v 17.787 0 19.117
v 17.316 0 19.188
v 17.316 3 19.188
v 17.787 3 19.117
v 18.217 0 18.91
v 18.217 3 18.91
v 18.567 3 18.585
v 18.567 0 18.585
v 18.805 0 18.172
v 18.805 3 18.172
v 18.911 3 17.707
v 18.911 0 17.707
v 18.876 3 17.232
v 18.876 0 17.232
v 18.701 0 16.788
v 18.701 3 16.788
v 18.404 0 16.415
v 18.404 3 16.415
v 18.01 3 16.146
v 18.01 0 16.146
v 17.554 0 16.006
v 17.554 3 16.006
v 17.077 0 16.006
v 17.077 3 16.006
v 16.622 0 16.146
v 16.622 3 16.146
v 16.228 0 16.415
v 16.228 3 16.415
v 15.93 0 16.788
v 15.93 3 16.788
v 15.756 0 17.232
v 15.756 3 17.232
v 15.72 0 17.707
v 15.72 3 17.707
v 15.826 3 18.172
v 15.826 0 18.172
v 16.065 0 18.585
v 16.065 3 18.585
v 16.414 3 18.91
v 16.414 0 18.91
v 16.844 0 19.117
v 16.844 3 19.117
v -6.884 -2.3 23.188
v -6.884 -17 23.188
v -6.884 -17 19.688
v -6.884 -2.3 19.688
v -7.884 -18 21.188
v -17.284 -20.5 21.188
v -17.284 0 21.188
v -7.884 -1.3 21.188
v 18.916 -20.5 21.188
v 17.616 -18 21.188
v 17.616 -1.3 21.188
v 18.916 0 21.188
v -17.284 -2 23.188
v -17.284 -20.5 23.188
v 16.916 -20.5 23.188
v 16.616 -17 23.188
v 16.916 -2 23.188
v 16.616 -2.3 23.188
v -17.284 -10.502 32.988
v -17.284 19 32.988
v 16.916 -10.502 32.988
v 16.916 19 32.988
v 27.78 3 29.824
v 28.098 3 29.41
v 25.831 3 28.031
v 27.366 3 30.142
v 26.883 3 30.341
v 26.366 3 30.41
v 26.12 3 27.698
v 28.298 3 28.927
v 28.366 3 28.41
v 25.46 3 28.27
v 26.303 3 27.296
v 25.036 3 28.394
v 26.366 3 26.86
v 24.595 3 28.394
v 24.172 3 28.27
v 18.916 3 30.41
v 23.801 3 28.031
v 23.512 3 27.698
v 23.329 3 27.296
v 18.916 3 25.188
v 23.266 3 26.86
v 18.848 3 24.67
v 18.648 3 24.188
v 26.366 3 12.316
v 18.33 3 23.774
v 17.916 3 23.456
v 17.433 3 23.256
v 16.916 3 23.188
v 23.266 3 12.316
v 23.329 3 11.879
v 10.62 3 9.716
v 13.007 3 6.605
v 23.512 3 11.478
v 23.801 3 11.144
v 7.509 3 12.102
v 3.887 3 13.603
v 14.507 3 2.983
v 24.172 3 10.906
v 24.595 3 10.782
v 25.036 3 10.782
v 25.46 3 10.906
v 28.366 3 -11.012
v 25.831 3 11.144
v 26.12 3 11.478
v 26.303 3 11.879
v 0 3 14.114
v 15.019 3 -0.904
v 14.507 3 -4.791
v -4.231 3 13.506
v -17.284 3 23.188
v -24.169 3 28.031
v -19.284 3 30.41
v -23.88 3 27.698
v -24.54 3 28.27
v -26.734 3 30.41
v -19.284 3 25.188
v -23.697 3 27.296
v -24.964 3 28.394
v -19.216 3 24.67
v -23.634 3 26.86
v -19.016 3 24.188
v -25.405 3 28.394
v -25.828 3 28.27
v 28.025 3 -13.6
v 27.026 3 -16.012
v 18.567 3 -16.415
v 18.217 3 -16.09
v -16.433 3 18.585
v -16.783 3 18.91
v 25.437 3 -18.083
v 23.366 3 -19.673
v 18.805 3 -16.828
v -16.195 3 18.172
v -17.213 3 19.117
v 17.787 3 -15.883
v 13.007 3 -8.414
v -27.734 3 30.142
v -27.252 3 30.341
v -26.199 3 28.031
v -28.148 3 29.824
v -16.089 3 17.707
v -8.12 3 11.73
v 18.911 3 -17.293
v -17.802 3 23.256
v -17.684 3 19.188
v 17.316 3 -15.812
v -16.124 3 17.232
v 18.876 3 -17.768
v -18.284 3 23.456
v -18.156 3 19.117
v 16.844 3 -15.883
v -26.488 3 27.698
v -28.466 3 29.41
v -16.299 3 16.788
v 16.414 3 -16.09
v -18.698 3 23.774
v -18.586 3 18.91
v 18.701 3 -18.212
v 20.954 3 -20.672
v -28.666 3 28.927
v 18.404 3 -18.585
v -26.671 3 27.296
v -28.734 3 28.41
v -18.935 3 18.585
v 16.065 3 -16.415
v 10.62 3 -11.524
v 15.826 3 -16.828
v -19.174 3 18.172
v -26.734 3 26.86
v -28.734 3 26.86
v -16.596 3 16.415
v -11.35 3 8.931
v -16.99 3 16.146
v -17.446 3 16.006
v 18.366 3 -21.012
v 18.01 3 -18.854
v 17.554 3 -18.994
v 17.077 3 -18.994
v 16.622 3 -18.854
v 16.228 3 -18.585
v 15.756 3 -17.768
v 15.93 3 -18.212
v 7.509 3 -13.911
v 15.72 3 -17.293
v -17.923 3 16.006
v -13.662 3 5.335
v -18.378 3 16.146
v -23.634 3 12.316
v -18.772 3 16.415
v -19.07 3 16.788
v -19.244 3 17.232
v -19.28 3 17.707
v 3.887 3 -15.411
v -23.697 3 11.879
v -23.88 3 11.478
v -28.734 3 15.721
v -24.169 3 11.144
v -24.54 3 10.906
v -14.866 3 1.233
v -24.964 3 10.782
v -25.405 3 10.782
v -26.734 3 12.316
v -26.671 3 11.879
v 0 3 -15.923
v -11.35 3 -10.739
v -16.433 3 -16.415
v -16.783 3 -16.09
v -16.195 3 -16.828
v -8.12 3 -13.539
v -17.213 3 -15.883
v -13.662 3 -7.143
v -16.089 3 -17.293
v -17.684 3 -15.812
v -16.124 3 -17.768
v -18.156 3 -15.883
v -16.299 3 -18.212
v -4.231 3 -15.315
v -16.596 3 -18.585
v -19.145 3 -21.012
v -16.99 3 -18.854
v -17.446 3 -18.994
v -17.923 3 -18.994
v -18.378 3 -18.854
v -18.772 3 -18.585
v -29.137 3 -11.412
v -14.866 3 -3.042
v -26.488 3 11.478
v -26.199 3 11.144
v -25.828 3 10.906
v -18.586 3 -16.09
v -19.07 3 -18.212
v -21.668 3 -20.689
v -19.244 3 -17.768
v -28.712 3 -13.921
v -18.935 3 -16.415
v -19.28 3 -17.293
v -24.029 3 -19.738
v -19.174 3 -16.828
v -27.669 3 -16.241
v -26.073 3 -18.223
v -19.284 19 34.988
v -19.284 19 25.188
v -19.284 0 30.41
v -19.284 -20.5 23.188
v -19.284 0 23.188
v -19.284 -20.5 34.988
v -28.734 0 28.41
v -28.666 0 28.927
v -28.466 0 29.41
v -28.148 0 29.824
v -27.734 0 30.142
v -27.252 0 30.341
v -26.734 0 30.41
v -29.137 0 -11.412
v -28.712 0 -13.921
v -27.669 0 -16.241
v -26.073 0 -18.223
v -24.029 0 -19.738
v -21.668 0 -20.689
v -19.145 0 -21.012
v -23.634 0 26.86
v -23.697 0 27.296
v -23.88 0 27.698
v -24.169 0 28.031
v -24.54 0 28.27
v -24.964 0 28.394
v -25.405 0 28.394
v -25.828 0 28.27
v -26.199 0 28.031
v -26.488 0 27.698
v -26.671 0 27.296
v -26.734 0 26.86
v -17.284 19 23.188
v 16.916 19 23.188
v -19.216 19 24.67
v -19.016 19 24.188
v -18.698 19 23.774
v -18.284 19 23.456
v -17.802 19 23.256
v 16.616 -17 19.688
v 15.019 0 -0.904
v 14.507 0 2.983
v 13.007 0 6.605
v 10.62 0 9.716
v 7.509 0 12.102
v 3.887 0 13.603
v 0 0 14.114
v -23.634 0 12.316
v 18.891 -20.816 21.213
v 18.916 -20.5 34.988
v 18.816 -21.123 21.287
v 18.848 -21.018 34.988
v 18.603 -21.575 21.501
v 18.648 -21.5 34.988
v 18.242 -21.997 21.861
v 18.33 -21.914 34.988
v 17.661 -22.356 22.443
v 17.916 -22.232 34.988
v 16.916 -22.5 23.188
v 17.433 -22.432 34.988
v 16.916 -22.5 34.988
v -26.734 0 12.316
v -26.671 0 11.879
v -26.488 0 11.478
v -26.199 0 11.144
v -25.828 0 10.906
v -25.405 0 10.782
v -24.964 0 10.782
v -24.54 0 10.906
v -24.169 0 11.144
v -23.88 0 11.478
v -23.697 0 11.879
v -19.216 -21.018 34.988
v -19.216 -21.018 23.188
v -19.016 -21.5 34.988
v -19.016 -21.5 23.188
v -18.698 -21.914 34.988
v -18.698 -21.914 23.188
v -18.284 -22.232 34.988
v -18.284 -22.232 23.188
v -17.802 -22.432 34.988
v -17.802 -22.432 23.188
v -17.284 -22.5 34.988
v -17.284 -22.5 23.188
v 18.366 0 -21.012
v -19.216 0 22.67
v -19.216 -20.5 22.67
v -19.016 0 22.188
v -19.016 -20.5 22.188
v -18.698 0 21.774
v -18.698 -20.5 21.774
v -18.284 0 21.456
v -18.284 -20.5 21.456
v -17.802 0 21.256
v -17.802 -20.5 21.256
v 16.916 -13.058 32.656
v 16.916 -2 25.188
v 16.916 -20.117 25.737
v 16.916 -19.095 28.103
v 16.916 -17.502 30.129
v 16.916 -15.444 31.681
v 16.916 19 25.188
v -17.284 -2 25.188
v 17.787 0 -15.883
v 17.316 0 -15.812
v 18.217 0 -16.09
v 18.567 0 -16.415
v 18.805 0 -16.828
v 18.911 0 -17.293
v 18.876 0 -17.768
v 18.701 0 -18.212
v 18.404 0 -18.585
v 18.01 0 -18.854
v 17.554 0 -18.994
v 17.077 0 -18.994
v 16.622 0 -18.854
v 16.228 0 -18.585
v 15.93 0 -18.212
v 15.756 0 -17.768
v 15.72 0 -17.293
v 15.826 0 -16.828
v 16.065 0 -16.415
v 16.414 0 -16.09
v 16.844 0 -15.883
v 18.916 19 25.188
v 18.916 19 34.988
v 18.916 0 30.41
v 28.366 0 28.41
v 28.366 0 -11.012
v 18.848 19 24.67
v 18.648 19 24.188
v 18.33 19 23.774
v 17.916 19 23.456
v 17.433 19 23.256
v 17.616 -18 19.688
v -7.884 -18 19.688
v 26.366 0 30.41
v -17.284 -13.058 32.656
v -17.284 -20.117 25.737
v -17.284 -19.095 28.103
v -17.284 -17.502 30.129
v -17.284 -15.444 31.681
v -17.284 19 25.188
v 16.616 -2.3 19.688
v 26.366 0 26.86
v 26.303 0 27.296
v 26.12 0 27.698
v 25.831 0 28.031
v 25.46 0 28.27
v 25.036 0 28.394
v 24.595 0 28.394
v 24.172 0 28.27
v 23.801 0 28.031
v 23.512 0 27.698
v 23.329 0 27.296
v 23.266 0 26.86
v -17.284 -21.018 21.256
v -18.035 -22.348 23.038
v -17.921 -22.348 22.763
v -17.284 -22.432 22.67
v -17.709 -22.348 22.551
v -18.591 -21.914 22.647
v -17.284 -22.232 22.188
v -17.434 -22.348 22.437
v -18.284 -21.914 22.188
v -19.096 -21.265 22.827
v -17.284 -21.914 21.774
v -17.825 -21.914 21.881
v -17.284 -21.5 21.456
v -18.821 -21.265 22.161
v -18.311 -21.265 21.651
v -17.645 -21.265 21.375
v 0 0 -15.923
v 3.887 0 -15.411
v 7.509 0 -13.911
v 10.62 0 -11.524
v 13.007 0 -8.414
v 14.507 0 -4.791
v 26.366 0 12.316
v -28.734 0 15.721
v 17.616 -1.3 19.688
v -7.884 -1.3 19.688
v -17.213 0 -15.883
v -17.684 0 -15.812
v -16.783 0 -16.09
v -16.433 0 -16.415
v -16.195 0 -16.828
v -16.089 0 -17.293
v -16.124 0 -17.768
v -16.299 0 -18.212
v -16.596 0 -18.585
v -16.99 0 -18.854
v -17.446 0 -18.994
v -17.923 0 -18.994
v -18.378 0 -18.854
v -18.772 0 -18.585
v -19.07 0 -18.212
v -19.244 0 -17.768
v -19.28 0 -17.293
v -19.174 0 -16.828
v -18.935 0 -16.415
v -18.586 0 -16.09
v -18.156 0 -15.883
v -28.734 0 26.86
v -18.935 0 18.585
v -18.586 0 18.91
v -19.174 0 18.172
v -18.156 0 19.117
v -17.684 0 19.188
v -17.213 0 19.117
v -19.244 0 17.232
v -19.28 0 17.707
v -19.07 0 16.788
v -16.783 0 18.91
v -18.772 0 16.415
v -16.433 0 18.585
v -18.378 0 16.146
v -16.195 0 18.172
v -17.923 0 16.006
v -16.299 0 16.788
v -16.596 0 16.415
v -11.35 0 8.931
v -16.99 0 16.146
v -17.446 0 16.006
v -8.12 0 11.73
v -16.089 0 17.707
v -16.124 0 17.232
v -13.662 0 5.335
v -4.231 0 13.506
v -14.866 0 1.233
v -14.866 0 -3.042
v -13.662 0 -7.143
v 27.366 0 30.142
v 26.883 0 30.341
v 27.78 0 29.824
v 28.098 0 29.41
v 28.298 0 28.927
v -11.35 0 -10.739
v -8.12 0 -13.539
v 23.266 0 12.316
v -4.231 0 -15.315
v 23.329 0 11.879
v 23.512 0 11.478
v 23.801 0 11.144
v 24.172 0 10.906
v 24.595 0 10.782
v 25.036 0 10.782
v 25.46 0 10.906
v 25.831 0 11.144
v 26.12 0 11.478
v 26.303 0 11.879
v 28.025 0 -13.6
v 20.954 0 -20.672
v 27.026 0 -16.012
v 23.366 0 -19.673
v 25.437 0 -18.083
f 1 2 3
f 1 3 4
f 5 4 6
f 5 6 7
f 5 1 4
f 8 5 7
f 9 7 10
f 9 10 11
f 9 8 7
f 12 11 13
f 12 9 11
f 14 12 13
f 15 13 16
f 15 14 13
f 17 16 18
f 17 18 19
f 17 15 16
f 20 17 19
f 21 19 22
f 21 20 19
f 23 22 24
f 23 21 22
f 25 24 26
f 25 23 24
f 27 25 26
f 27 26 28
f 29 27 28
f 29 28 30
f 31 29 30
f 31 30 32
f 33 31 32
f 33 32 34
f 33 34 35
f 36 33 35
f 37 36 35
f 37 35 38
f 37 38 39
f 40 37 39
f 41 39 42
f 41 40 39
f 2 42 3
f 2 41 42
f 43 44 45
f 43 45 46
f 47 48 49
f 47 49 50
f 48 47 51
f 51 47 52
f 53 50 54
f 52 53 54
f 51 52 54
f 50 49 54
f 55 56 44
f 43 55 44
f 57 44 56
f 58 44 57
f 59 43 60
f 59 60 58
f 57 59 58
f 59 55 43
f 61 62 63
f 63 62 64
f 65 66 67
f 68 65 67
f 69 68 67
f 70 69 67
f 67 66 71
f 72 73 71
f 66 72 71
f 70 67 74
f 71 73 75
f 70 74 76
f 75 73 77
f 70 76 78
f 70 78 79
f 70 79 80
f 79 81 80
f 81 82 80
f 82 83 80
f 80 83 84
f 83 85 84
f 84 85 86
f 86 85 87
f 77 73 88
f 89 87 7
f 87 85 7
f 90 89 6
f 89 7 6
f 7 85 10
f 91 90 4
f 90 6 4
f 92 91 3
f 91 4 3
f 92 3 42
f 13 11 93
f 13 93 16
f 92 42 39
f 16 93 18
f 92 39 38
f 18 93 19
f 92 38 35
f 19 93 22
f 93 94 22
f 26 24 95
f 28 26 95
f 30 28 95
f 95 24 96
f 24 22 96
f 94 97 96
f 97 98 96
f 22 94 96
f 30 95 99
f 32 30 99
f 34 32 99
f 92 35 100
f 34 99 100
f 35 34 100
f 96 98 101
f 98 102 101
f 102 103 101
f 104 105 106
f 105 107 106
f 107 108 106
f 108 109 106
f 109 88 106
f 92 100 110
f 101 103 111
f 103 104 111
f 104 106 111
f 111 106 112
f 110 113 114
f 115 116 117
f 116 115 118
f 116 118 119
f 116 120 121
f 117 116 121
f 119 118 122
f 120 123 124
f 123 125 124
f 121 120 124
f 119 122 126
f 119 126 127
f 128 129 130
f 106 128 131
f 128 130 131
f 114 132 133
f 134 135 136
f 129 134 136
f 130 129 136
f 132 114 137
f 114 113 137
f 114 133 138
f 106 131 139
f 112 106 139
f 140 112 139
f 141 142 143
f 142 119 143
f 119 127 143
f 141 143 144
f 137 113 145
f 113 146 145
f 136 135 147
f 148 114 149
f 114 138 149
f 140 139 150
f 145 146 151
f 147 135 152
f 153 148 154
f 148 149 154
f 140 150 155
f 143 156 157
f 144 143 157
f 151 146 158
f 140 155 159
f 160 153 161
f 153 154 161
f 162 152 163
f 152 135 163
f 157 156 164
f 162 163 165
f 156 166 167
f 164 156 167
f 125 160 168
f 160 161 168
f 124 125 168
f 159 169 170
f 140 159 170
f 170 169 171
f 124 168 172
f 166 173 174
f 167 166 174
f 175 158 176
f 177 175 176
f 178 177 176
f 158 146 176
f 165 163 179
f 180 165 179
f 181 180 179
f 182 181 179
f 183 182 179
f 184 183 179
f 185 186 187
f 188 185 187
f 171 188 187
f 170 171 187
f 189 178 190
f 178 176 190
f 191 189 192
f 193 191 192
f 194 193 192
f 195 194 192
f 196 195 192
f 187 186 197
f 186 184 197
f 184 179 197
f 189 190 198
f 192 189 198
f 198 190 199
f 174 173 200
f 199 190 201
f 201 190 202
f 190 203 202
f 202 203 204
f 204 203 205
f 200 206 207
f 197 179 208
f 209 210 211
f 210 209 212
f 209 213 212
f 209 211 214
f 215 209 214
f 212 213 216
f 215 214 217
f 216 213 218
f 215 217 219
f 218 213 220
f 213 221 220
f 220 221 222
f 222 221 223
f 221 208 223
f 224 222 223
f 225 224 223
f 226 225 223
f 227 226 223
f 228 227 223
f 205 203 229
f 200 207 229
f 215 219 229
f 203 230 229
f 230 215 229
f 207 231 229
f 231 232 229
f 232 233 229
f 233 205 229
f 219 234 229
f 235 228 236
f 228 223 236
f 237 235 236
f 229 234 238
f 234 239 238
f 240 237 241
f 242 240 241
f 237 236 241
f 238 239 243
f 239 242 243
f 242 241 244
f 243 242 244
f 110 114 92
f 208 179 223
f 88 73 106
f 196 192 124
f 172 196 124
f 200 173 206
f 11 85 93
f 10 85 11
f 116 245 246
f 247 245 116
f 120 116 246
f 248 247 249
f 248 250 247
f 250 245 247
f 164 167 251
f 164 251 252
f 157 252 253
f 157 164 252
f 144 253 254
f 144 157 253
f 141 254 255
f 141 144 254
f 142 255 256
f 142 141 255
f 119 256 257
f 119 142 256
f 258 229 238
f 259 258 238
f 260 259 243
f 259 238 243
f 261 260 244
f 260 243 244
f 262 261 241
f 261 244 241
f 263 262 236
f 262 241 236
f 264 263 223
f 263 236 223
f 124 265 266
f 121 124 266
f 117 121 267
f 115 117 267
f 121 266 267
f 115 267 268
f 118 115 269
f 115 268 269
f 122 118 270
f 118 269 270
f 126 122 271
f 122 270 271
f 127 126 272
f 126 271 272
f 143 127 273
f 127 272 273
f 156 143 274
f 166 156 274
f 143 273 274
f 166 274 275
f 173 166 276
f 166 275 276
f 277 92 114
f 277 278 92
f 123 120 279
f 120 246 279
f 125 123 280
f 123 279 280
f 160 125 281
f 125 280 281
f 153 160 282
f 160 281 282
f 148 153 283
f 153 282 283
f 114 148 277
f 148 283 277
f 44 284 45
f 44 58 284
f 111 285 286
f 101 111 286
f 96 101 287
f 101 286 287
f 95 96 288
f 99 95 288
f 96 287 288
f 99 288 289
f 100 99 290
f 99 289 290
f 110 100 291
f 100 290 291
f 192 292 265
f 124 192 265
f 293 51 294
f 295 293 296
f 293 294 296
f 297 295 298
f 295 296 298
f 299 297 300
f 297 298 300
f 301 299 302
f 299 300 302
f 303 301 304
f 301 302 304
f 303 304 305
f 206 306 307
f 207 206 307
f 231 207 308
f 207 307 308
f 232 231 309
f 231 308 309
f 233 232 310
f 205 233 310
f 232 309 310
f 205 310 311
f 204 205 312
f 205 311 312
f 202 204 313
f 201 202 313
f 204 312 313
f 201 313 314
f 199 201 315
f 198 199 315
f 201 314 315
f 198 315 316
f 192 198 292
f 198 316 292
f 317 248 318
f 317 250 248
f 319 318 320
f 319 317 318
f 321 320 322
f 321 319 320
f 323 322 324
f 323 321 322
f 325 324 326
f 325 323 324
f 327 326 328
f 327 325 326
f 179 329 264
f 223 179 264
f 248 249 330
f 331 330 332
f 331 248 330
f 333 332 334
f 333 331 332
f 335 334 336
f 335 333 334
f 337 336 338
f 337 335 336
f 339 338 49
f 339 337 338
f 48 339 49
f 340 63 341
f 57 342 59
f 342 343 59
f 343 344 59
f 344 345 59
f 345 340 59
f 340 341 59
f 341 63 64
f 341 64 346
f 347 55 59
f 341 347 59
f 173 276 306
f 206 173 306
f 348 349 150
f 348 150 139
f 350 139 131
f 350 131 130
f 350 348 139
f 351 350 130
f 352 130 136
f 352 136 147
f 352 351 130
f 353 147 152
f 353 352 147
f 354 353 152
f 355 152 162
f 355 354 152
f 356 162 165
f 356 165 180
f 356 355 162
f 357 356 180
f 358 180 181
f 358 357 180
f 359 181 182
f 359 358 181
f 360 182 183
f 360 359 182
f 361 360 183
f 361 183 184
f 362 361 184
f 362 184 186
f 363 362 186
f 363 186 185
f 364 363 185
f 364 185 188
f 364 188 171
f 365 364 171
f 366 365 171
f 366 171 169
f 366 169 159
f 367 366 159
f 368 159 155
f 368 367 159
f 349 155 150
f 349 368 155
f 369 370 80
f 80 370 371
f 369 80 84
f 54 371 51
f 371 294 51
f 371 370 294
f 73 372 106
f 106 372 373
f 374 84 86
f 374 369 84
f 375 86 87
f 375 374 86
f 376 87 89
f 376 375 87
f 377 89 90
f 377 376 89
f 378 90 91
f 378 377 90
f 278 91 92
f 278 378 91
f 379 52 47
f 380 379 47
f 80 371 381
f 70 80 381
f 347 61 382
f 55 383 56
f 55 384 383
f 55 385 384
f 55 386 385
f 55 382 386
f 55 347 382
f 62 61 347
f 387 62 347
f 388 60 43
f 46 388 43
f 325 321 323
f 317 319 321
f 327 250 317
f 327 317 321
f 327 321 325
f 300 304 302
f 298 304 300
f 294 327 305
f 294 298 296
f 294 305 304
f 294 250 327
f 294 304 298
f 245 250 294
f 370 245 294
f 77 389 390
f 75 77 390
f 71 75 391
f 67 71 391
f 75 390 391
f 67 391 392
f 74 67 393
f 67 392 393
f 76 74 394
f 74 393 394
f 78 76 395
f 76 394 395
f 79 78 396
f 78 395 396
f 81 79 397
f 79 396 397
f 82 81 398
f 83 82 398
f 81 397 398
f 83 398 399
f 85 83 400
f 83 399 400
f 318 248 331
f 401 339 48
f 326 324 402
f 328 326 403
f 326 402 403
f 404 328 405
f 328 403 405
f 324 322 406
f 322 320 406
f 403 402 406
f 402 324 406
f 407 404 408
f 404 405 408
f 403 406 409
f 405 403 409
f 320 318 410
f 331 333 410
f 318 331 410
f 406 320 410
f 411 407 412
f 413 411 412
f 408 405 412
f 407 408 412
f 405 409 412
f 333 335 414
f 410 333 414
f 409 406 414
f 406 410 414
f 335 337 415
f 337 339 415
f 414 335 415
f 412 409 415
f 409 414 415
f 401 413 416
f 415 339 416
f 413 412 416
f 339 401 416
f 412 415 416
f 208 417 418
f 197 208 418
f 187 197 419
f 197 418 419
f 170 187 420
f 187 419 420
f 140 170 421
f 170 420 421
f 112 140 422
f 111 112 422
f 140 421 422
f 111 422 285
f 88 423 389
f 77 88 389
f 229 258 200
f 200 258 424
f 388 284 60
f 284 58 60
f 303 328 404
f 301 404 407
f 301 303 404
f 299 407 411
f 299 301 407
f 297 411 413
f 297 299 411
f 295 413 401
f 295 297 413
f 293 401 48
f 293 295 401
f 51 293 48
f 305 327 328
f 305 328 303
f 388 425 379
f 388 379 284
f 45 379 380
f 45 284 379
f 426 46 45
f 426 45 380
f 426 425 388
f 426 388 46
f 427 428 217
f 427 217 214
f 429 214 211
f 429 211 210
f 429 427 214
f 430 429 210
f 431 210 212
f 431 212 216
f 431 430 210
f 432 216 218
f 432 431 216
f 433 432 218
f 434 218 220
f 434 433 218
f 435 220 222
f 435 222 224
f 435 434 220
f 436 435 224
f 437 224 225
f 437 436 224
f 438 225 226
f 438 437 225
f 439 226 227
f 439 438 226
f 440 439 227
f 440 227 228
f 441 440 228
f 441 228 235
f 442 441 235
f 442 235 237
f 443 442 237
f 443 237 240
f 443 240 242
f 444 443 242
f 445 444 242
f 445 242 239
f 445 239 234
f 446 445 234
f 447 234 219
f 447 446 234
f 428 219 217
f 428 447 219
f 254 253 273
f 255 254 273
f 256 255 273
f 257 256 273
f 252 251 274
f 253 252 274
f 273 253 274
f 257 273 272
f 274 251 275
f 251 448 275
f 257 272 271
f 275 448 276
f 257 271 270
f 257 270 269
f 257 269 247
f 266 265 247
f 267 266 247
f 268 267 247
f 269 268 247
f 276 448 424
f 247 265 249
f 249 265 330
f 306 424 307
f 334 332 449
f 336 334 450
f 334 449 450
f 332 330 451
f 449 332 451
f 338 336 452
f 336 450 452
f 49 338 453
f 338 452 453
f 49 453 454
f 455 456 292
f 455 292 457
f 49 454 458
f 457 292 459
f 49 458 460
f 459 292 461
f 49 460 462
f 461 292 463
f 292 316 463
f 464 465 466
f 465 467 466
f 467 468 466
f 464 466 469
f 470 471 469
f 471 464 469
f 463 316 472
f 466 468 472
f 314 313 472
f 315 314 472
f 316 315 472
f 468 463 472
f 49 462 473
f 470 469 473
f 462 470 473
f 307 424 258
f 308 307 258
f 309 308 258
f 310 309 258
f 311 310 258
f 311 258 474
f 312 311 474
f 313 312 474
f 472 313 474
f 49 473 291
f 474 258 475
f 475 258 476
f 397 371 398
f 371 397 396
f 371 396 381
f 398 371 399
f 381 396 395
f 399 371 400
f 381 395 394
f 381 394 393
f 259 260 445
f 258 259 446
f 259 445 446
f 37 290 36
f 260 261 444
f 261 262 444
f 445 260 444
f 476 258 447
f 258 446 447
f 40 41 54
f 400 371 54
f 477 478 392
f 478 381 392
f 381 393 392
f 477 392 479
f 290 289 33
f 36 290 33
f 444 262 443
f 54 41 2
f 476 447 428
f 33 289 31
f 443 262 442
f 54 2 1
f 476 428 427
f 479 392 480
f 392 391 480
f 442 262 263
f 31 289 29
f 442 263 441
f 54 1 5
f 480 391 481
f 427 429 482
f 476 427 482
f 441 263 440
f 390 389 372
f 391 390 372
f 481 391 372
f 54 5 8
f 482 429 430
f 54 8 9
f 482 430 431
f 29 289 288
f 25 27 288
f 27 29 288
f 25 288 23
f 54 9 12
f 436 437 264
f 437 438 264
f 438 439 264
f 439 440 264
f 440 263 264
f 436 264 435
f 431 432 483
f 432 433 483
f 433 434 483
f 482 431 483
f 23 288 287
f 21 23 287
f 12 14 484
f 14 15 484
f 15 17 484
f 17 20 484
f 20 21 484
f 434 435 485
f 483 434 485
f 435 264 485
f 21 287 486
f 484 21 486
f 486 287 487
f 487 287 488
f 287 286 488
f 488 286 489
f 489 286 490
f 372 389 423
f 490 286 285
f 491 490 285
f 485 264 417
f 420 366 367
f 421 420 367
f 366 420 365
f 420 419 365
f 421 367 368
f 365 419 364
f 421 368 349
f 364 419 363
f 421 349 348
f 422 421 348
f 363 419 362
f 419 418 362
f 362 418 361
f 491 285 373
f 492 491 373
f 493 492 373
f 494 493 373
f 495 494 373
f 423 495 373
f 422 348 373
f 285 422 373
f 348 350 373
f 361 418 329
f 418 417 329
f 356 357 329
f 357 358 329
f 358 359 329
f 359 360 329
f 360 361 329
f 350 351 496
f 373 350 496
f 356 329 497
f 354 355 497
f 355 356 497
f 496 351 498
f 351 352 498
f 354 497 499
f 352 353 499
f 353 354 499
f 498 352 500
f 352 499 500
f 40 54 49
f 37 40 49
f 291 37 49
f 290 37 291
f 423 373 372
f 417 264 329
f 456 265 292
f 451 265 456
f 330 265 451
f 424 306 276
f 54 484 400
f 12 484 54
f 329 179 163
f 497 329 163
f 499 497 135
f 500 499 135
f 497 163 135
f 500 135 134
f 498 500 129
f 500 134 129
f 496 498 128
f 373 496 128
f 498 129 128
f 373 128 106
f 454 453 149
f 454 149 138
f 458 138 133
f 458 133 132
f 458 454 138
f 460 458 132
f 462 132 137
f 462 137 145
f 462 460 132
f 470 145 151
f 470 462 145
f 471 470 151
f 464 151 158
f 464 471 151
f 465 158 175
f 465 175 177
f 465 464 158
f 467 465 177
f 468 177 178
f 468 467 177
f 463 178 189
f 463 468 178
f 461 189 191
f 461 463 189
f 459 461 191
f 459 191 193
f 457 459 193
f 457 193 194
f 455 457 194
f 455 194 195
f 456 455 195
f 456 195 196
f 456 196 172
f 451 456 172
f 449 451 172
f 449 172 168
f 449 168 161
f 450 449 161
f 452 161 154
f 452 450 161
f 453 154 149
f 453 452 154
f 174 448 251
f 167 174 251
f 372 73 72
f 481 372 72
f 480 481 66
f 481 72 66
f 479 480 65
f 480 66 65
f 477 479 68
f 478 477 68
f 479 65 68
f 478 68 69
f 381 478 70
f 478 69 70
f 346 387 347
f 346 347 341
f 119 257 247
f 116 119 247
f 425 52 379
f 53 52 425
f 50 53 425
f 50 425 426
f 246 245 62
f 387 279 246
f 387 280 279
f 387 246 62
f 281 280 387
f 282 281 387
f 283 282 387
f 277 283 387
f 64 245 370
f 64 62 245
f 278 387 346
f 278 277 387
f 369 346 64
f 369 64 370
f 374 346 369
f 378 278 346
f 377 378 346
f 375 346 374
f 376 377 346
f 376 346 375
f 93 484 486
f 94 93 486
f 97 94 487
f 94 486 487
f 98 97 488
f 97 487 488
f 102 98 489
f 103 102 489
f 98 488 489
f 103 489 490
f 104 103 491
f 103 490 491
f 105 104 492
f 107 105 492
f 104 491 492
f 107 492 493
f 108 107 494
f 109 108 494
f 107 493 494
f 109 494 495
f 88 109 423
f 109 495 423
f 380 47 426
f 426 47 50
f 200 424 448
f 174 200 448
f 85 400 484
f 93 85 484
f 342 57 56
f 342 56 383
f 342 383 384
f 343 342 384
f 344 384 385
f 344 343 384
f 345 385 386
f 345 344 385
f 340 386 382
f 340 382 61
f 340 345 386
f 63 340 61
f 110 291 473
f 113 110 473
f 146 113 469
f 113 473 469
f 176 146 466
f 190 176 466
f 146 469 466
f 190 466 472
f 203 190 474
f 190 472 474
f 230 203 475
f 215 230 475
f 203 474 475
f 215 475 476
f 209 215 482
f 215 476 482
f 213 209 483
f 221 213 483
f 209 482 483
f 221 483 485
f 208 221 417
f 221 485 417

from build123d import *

# Parameters (mm, degrees)
CROQUIS1_R                    = 1.6
SALIENTE_EXTRUIR1_DEPTH       = 3
SALIENTE_EXTRUIR2_DEPTH       = 40
SALIENTE_EXTRUIR2_DEPTH_BACK  = 6
CROQUIS2_W                    = 38.2
CROQUIS2_H                    = 16.8
CROQUIS3_W                    = 34.2
CROQUIS3_H                    = 12.8
CORTAR_EXTRUIR1_DEPTH         = 40
CROQUIS5_W                    = 23.5
CROQUIS5_H                    = 14.7
CORTAR_EXTRUIR2_DEPTH         = 2
CROQUIS7_W                    = 25.5
CROQUIS7_H                    = 16.7
CROQUIS7_W_2                  = 23.5
CROQUIS7_H_2                  = 14.7
SALIENTE_EXTRUIR11_DEPTH      = 1.5
CROQUIS8_W                    = 38.2
CROQUIS8_H                    = 16.8
CORTAR_EXTRUIR8_DEPTH         = 19.5
CROQUIS9_W                    = 38.2
CROQUIS9_H                    = 16.8
SALIENTE_EXTRUIR12_DEPTH      = 2
CROQUIS11_W                   = 38.2
CROQUIS11_H                   = 16.8
SALIENTE_EXTRUIR13_DEPTH      = 13
CROQUIS12_W                   = 34.2
CROQUIS12_H                   = 12.8
CORTAR_EXTRUIR9_DEPTH         = 25
CROQUIS13_W                   = 5.5
CROQUIS13_H                   = 5
SALIENTE_EXTRUIR14_DEPTH      = 15
SALIENTE_EXTRUIR15_DEPTH      = 10
SALIENTE_EXTRUIR15_DEPTH_BACK = 14
CROQUIS14_W                   = 3.5
CROQUIS14_H                   = 12.8
CROQUIS16_W                   = 12.8
CROQUIS16_H                   = 24
SALIENTE_EXTRUIR16_DEPTH      = 2.5
CORTAR_EXTRUIR12_DEPTH        = 3
CROQUIS20_W                   = 7.565862741
CROQUIS20_H                   = 3.217792011
CORTAR_EXTRUIR13_DEPTH        = 0.5
CROQUIS22_W                   = 6
CROQUIS22_H                   = 12.8
CORTAR_EXTRUIR14_DEPTH        = 27
CROQUIS23_W                   = 34.2
CROQUIS23_H                   = 3
SALIENTE_EXTRUIR17_DEPTH      = 40
REDONDEO3_R                   = 10
CROQUIS24_W                   = 34.2
CROQUIS24_H                   = 2
SALIENTE_EXTRUIR18_DEPTH      = 21
CROQUIS25_W                   = 38.2
CROQUIS25_H                   = 16
CORTAR_EXTRUIR15_DEPTH        = 2
CROQUIS26_W                   = 38.2
CROQUIS26_H                   = 41.5
CORTAR_EXTRUIR16_DEPTH        = 3
REDONDEO4_R                   = 2


with BuildPart() as part:
    # Croquis1 → Saliente-Extruir1 (new body)
    # profile 1 of 2: a face of its own
    with BuildSketch(Plane(origin=(0, 0, 0), x_dir=(1, 0, 0), z_dir=(0, 1, 0))):
        Polygon((-25.184210526, -30.409629763), (0, -30.409629763), (26.365789474, -30.409629763), (28.365789474, -30.409629763), (28.365789474, -12.315808834), (28.365789474, 17.012280702), (28.365789474, 19.012280702), (28.365789474, 21.012280702), (-29.249413206, 21.012280702), (-29.249413206, 19.012280702), (-28.733990356, -15.721221442), (-28.734210526, -26.859629763), (-28.734210526, -30.409629763), align=None)
        with BuildLine():
            ThreePointArc((-23.634210526, -26.859629763), (-25.184210526, -28.409629763), (-26.734210526, -26.859629763))
            Line((-26.734210526, -26.859629763), (-26.734210526, -12.315808834))
            ThreePointArc((-26.734210526, -12.315808834), (-25.184210526, -10.765808834), (-23.634210526, -12.315808834))
            Line((-23.634210526, -12.315808834), (-23.634210526, -26.859629763))
        make_face(mode=Mode.SUBTRACT)
        with Locations(Location((-17.684210526, -17.587719298, 0), (0, 0, 270))):
            Circle(CROQUIS1_R, mode=Mode.SUBTRACT)
        with Locations(Location((17.315789474, -17.587719298, 0), (0, 0, 270))):
            Circle(CROQUIS1_R, mode=Mode.SUBTRACT)
        with BuildLine():
            Line((26.365789474, -12.315808834), (26.365789474, -26.859629763))
            ThreePointArc((26.365789474, -26.859629763), (24.815789474, -28.409629763), (23.265789474, -26.859629763))
            Line((23.265789474, -26.859629763), (23.265789474, -12.315808834))
            ThreePointArc((23.265789474, -12.315808834), (24.815789474, -10.765808834), (26.365789474, -12.315808834))
        make_face(mode=Mode.SUBTRACT)
        with Locations(Location((-17.684210526, 17.412280702, 0), (0, 0, 270))):
            Circle(CROQUIS1_R, mode=Mode.SUBTRACT)
        with BuildLine():
            ThreePointArc((0, -14.11448633), (-15.018728155, 0.904241825), (0, 15.922969981))
            ThreePointArc((0, 15.922969981), (10.619844524, 11.524086349), (15.018728155, 0.904241825))
            ThreePointArc((15.018728155, 0.904241825), (10.619844524, -9.715602698), (0, -14.11448633))
        make_face(mode=Mode.SUBTRACT)
        with Locations(Location((17.315789474, 17.412280702, 0), (0, 0, 270))):
            Circle(CROQUIS1_R, mode=Mode.SUBTRACT)
    # profile 2 of 2: a face of its own
    with BuildSketch(Plane(origin=(0, 0, 0), x_dir=(1, 0, 0), z_dir=(0, 1, 0))):
        Polygon((-25.184210526, -30.409629763), (0, -30.409629763), (26.365789474, -30.409629763), (28.365789474, -30.409629763), (28.365789474, -12.315808834), (28.365789474, 17.012280702), (28.365789474, 19.012280702), (28.365789474, 21.012280702), (-29.249413206, 21.012280702), (-29.249413206, 19.012280702), (-28.733990356, -15.721221442), (-28.734210526, -26.859629763), (-28.734210526, -30.409629763), align=None)
        with BuildLine():
            ThreePointArc((-23.634210526, -26.859629763), (-25.184210526, -28.409629763), (-26.734210526, -26.859629763))
            Line((-26.734210526, -26.859629763), (-26.734210526, -12.315808834))
            ThreePointArc((-26.734210526, -12.315808834), (-25.184210526, -10.765808834), (-23.634210526, -12.315808834))
            Line((-23.634210526, -12.315808834), (-23.634210526, -26.859629763))
        make_face(mode=Mode.SUBTRACT)
        with Locations(Location((-17.684210526, -17.587719298, 0), (0, 0, 270))):
            Circle(CROQUIS1_R, mode=Mode.SUBTRACT)
        with Locations(Location((17.315789474, -17.587719298, 0), (0, 0, 270))):
            Circle(CROQUIS1_R, mode=Mode.SUBTRACT)
        with BuildLine():
            Line((26.365789474, -12.315808834), (26.365789474, -26.859629763))
            ThreePointArc((26.365789474, -26.859629763), (24.815789474, -28.409629763), (23.265789474, -26.859629763))
            Line((23.265789474, -26.859629763), (23.265789474, -12.315808834))
            ThreePointArc((23.265789474, -12.315808834), (24.815789474, -10.765808834), (26.365789474, -12.315808834))
        make_face(mode=Mode.SUBTRACT)
        with Locations(Location((-17.684210526, 17.412280702, 0), (0, 0, 270))):
            Circle(CROQUIS1_R, mode=Mode.SUBTRACT)
        with BuildLine():
            ThreePointArc((0, -14.11448633), (-15.018728155, 0.904241825), (0, 15.922969981))
            ThreePointArc((0, 15.922969981), (10.619844524, 11.524086349), (15.018728155, 0.904241825))
            ThreePointArc((15.018728155, 0.904241825), (10.619844524, -9.715602698), (0, -14.11448633))
        make_face(mode=Mode.SUBTRACT)
        with Locations(Location((17.315789474, 17.412280702, 0), (0, 0, 270))):
            Circle(CROQUIS1_R, mode=Mode.SUBTRACT)
    extrude(amount=SALIENTE_EXTRUIR1_DEPTH)

    # Croquis2 → Saliente-Extruir2 (add, two sides: drawn at the far end of the back side and taken through both)
    with BuildSketch(Plane.XZ.offset(-SALIENTE_EXTRUIR2_DEPTH_BACK)):
        with Locations((-0.184210526, 29.587719298)):
            Rectangle(CROQUIS2_W, CROQUIS2_H)
    extrude(amount=SALIENTE_EXTRUIR2_DEPTH + SALIENTE_EXTRUIR2_DEPTH_BACK)

    # Croquis3 → Cortar-Extruir1 (cut)
    with BuildSketch(Plane.XZ.offset(40)):
        with Locations((-0.184210526, 29.587719298)):
            Rectangle(CROQUIS3_W, CROQUIS3_H)
    extrude(amount=-CORTAR_EXTRUIR1_DEPTH, mode=Mode.SUBTRACT)

    # Croquis5 → Cortar-Extruir2 (cut)
    with BuildSketch(Plane(origin=(0, 0, 21.187719298), x_dir=(-1, 0, 0), z_dir=(0, 0, -1))):
        with Locations((-4.865789474, -9.65)):
            Rectangle(CROQUIS5_W, CROQUIS5_H)
    extrude(amount=-CORTAR_EXTRUIR2_DEPTH, mode=Mode.SUBTRACT)

    # Croquis7 → Saliente-Extruir11 (add)
    with BuildSketch(Plane(origin=(0, 0, 21.187719298), x_dir=(-1, 0, 0), z_dir=(0, 0, -1))):
        with Locations((-4.865789474, -9.65)):
            Rectangle(CROQUIS7_W, CROQUIS7_H)
        with Locations((-4.865789474, -9.65)):
            Rectangle(CROQUIS7_W_2, CROQUIS7_H_2, mode=Mode.SUBTRACT)
    extrude(amount=SALIENTE_EXTRUIR11_DEPTH)

    # Croquis8 → Cortar-Extruir8 (cut)
    with BuildSketch(Plane.XZ.offset(40)):
        with Locations((-0.184210526, 29.587719298)):
            Rectangle(CROQUIS8_W, CROQUIS8_H)
    extrude(amount=-CORTAR_EXTRUIR8_DEPTH, mode=Mode.SUBTRACT)

    # Croquis9 → Saliente-Extruir12 (add)
    with BuildSketch(Plane.XZ.offset(20.5)):
        with Locations((-0.184210526, 29.587719298)):
            Rectangle(CROQUIS9_W, CROQUIS9_H)
    extrude(amount=SALIENTE_EXTRUIR12_DEPTH)

    # Croquis11 → Saliente-Extruir13 (add)
    with BuildSketch(Plane(origin=(0, 6, 0), x_dir=(1, 0, 0), z_dir=(0, 1, 0))):
        with Locations((-0.184210526, -29.587719298)):
            Rectangle(CROQUIS11_W, CROQUIS11_H)
    extrude(amount=SALIENTE_EXTRUIR13_DEPTH)

    # Croquis12 → Cortar-Extruir9 (cut)
    with BuildSketch(Plane(origin=(0, 19, 0), x_dir=(1, 0, 0), z_dir=(0, 1, 0))):
        with Locations((-0.184210526, -29.587719298)):
            Rectangle(CROQUIS12_W, CROQUIS12_H)
    extrude(amount=-CORTAR_EXTRUIR9_DEPTH, mode=Mode.SUBTRACT)

    # Croquis13 → Saliente-Extruir14 (add)
    with BuildSketch(Plane(origin=(0, 0, 21.187719298), x_dir=(-1, 0, 0), z_dir=(0, 0, -1))):
        with Locations((16.534210526, -2.5)):
            Rectangle(CROQUIS13_W, CROQUIS13_H)
    extrude(amount=-SALIENTE_EXTRUIR14_DEPTH)

    # Croquis14 → Saliente-Extruir15 (add, two sides: drawn at the far end of the back side and taken through both)
    with BuildSketch(Plane(origin=(0, 0, 0), x_dir=(1, 0, 0), z_dir=(0, 1, 0)).offset(-SALIENTE_EXTRUIR15_DEPTH_BACK)):
        with Locations((-15.534210526, -29.587719298)):
            Rectangle(CROQUIS14_W, CROQUIS14_H)
    extrude(amount=SALIENTE_EXTRUIR15_DEPTH + SALIENTE_EXTRUIR15_DEPTH_BACK)

    # Croquis16 → Saliente-Extruir16 (add)
    with BuildSketch(Plane(origin=(-13.784210526, 0, 0), x_dir=(0, 0, -1), z_dir=(1, 0, 0))):
        with Locations((-29.587719298, -2)):
            Rectangle(CROQUIS16_W, CROQUIS16_H)
    extrude(amount=SALIENTE_EXTRUIR16_DEPTH)

    # Croquis19 → Cortar-Extruir12 (cut)
    with BuildSketch(Plane(origin=(0, 3, 0), x_dir=(1, 0, 0), z_dir=(0, 1, 0))):
        with BuildLine():
            Line((28.365789474, 21.012280702), (18.365789474, 21.012280702))
            ThreePointArc((18.365789474, 21.012280702), (25.436857286, 18.083348514), (28.365789474, 11.012280702))
            Line((28.365789474, 11.012280702), (28.365789474, 21.012280702))
        make_face()
        with BuildLine():
            Line((-29.249413206, 21.012280702), (-29.179333075, 14.289695354))
            Line((-29.179333075, 14.289695354), (-29.13663051, 11.412039439))
            ThreePointArc((-29.13663051, 11.412039439), (-26.072914346, 18.223299609), (-19.144624058, 21.012280702))
            Line((-19.144624058, 21.012280702), (-29.249413206, 21.012280702))
        make_face()
        with BuildLine():
            Line((28.365789474, -30.409629763), (28.365789474, -28.409629763))
            ThreePointArc((28.365789474, -28.409629763), (27.780003036, -29.823843325), (26.365789474, -30.409629763))
            Line((26.365789474, -30.409629763), (28.365789474, -30.409629763))
        make_face()
        with BuildLine():
            ThreePointArc((-28.734210526, -28.409629763), (-28.148424089, -29.823843325), (-26.734210526, -30.409629763))
            Line((-26.734210526, -30.409629763), (-28.734210526, -30.409629763))
            Line((-28.734210526, -30.409629763), (-28.734210526, -28.409629763))
        make_face()
    extrude(amount=-CORTAR_EXTRUIR12_DEPTH, mode=Mode.SUBTRACT)


with BuildPart() as cortar_extruir12_piece_1:
    # of the separate pieces the step leaves, piece 1, a body of its own (cortar_extruir12_pieces)
    add(part.part.solids().sort_by_distance((-26.734210526, 0, 30.409629763))[0])

    # Croquis22 → Cortar-Extruir14 (cut)
    with BuildSketch(Plane(origin=(0, 10, 0), x_dir=(1, 0, 0), z_dir=(0, 1, 0))):
        with Locations((-14.284210526, -29.587719298)):
            Rectangle(CROQUIS22_W, CROQUIS22_H)
    extrude(amount=-CORTAR_EXTRUIR14_DEPTH, mode=Mode.SUBTRACT)

    # Croquis23 → Saliente-Extruir17 (add)
    with BuildSketch(Plane(origin=(0, 19, 0), x_dir=(1, 0, 0), z_dir=(0, 1, 0))):
        with Locations((-0.184210526, -34.487719298)):
            Rectangle(CROQUIS23_W, CROQUIS23_H)
    extrude(amount=-SALIENTE_EXTRUIR17_DEPTH)

    # Redondeo3
    # the kernel refuses this fillet: 10 mm, written as the material it adds along each edge
    with BuildSketch(Plane(origin=(16.915789474, -20.5, 32.987719298), x_dir=(0, 1, 0), z_dir=(-1, 0, 0))) as redondeo3_piece_1:
        with BuildLine():
            CenterArc((9.9979998, 10), REDONDEO3_R, 181.145991998, 88.854008002)
            Line((0, 9.8), (-0.199959996, 9.796))
            ThreePointArc((-0.199959996, 9.796), (-0.2, 4.9), (-0.2, 0))
            Line((-0.2, 0), (0, -0.2))
            Line((0, -0.2), (9.9979998, -0.2))
            Line((9.9979998, -0.2), (9.9979998, 0))
        make_face()
    extrude(amount=34.2)

    # Croquis24 → Saliente-Extruir18 (add)
    with BuildSketch(Plane(origin=(0, 19, 0), x_dir=(1, 0, 0), z_dir=(0, 1, 0))):
        with Locations((-0.184210526, -24.187719298)):
            Rectangle(CROQUIS24_W, CROQUIS24_H)
    extrude(amount=-SALIENTE_EXTRUIR18_DEPTH)

    # Croquis25 → Cortar-Extruir15 (cut)
    with BuildSketch(Plane(origin=(0, 0, 21.187719298), x_dir=(-1, 0, 0), z_dir=(0, 0, -1))):
        with Locations((0.184210526, 11)):
            Rectangle(CROQUIS25_W, CROQUIS25_H)
    extrude(amount=-CORTAR_EXTRUIR15_DEPTH, mode=Mode.SUBTRACT)

    # Croquis26 → Cortar-Extruir16 (cut)
    with BuildSketch(Plane.XY.offset(37.987719298)):
        with Locations((-0.184210526, -1.75)):
            Rectangle(CROQUIS26_W, CROQUIS26_H)
    extrude(amount=-CORTAR_EXTRUIR16_DEPTH, mode=Mode.SUBTRACT)

    # Redondeo4
    redondeo4_edges = [cortar_extruir12_piece_1.edges().sort_by_distance(p)[0] for p in [
        (-19.284210526, -11.25, 21.187719298),
        (-19.284210526, -22.5, 28.087719298),
        (-0.184210526, -22.5, 21.187719298),
        (18.915789474, -22.5, 28.087719298),
        (-19.284210526, 11, 23.187719298),
        (18.915789474, 11, 23.187719298),
    ]]
    fillet(redondeo4_edges, radius=REDONDEO4_R)


with BuildPart() as cortar_extruir12_piece_2:
    # of the separate pieces the step leaves, piece 2, a body of its own (cortar_extruir12_pieces)
    add(part.part.solids().sort_by_distance((-29.249413206, 0, -21.012280702))[0])

    # Croquis20 → Cortar-Extruir13 (cut)
    with BuildSketch(Plane(origin=(-28.960905799, 0, 0.42976123), x_dir=(0.014837723757860641, 0, 0.99988991491748), z_dir=(-0.99988991491748, 0, 0.014837723757860641))):
        with Locations((-18.504008527, 1.391103994)):
            Rectangle(CROQUIS20_W, CROQUIS20_H)
    extrude(amount=-CORTAR_EXTRUIR13_DEPTH, mode=Mode.SUBTRACT)


solid = cortar_extruir12_piece_1.part
